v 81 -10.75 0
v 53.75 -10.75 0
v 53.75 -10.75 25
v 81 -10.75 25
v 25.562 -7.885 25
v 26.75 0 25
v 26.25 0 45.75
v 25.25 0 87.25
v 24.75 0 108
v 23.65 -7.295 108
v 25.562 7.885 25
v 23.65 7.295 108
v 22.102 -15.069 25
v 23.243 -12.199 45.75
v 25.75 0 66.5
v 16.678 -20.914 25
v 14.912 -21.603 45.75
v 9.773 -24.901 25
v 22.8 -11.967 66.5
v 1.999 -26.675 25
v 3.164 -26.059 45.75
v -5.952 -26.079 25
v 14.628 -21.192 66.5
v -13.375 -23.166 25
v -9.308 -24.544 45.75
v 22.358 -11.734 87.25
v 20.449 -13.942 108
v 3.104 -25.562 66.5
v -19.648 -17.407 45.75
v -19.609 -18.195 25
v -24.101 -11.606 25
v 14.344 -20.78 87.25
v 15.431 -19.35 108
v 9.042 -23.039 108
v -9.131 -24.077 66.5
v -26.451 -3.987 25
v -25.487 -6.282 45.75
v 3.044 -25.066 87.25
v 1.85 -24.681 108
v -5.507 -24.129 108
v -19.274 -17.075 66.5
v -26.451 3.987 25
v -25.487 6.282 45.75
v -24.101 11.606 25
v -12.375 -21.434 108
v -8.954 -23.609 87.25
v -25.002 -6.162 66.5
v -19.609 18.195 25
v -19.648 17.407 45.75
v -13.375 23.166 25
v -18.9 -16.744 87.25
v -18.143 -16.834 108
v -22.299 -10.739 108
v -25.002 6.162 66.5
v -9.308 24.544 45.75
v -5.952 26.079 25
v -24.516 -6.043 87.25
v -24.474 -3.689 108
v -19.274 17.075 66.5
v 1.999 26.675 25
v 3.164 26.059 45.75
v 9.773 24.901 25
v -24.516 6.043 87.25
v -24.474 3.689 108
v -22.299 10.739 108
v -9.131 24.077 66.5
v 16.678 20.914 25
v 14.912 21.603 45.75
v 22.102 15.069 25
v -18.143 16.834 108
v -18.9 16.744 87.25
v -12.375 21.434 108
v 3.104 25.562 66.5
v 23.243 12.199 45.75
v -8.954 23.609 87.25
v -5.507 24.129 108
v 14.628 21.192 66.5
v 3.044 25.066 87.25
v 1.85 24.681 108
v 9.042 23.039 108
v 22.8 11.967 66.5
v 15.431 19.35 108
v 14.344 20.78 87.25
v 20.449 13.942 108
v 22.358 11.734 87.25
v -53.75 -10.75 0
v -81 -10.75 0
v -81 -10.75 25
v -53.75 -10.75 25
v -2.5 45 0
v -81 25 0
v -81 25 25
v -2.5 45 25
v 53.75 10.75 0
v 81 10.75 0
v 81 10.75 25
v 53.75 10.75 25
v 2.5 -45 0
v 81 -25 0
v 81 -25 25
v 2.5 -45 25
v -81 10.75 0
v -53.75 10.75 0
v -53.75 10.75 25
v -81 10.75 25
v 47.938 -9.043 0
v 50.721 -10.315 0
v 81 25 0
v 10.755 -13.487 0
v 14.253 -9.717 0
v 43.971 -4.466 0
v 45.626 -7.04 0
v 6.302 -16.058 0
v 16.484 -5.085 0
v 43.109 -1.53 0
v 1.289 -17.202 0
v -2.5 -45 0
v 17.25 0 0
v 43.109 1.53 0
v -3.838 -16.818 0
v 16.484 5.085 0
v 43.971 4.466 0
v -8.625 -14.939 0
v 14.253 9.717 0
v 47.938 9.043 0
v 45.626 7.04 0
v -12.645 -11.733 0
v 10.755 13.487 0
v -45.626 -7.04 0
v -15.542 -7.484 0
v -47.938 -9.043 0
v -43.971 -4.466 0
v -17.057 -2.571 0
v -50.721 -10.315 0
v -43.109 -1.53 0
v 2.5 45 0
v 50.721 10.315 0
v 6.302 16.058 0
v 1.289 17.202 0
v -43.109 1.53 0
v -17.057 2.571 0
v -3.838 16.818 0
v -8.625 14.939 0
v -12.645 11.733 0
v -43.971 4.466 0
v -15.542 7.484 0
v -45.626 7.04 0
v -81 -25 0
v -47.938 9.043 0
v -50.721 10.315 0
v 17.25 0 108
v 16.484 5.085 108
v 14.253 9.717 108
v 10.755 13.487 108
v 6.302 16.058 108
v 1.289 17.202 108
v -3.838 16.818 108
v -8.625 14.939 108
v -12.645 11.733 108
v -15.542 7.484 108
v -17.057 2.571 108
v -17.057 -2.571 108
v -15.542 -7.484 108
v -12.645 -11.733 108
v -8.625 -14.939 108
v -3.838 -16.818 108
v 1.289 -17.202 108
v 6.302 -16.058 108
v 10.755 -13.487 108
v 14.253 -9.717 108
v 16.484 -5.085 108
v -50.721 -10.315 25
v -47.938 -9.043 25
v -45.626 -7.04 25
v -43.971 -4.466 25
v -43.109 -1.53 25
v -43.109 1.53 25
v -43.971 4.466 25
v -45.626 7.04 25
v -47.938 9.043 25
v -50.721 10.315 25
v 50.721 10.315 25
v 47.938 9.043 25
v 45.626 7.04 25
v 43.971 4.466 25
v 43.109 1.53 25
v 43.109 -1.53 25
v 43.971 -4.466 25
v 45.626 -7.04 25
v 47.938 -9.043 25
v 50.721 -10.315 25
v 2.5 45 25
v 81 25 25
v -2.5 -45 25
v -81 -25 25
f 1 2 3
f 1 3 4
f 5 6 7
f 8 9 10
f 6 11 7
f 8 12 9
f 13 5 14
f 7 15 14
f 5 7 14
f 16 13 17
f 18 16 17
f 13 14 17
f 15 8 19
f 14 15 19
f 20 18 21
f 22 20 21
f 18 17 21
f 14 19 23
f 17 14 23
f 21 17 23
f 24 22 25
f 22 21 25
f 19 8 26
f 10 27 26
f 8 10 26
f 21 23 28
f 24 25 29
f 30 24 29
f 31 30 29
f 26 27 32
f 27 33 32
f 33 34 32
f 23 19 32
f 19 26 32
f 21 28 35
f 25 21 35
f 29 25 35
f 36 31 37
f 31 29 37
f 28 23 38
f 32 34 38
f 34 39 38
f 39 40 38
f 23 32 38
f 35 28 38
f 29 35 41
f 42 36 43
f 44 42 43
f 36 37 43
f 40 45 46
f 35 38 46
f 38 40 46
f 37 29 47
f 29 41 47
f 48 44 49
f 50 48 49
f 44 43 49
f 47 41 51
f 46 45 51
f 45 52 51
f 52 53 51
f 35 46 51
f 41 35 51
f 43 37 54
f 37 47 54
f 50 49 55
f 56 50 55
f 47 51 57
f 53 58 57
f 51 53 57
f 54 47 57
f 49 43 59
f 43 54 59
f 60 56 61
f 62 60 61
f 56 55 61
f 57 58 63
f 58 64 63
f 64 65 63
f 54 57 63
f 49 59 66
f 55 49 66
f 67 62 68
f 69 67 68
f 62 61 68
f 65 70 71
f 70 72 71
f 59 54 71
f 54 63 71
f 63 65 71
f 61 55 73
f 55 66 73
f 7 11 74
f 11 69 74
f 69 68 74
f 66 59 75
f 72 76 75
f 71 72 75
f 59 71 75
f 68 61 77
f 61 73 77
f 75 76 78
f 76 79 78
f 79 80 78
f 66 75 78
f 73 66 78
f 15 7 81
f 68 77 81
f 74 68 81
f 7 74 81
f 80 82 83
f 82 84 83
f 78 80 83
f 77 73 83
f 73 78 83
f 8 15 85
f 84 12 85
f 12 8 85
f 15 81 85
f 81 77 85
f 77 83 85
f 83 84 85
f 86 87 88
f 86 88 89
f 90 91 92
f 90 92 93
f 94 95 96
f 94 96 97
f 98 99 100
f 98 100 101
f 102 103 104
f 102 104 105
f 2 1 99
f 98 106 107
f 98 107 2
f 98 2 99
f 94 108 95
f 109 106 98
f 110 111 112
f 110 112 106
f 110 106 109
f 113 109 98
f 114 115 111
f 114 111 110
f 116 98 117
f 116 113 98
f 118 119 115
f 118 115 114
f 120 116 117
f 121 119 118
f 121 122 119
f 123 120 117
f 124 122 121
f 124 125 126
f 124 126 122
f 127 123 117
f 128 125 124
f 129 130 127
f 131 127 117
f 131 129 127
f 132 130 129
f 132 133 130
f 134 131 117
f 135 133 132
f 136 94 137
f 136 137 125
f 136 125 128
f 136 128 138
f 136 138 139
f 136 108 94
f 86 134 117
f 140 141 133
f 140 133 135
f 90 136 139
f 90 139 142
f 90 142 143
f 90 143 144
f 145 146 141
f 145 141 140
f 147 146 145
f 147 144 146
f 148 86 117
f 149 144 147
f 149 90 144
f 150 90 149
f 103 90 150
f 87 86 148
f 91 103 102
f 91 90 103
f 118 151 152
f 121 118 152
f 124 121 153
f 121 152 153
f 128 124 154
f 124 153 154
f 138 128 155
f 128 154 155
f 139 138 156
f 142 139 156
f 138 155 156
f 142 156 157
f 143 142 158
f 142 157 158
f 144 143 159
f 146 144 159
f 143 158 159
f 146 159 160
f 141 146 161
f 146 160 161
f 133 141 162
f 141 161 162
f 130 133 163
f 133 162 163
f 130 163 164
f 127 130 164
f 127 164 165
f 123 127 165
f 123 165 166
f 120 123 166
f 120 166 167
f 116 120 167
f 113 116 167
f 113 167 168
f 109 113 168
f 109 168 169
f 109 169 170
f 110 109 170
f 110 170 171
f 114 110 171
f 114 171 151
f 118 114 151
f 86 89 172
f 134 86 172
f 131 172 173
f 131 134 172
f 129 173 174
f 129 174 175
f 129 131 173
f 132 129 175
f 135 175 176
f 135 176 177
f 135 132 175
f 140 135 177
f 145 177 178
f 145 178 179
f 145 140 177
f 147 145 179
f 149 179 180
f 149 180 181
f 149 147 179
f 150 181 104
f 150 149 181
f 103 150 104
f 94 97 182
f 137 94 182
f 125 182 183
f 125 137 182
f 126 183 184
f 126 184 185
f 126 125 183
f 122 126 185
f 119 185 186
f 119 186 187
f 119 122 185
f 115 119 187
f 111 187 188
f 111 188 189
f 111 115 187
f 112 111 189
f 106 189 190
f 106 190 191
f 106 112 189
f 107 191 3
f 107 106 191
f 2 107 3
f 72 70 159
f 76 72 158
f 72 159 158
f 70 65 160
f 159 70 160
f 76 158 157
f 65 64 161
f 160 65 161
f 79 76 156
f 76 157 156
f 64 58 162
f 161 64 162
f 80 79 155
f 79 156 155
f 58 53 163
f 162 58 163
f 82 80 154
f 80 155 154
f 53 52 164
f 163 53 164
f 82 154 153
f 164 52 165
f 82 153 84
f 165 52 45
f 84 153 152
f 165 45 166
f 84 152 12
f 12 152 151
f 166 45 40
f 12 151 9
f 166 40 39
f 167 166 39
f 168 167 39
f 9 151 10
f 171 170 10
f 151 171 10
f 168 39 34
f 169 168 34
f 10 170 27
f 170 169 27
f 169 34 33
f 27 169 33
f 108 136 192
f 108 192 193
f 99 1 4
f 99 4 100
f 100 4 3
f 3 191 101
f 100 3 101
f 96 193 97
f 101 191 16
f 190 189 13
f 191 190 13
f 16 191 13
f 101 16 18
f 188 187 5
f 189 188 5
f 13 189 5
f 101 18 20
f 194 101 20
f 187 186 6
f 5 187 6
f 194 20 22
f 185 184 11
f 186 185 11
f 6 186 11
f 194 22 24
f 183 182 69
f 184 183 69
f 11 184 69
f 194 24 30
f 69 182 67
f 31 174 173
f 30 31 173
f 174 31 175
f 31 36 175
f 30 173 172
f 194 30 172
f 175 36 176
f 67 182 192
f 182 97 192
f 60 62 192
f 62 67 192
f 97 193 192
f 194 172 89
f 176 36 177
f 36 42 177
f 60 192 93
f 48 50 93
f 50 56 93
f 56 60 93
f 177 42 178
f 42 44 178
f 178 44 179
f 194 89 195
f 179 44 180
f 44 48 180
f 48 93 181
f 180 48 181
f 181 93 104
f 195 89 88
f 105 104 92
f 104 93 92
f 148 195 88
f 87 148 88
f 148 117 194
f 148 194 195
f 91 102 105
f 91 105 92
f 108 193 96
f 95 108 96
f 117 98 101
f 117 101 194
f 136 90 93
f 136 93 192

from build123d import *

# Parameters (mm, degrees)
BOSS_EXTRUDE1_DEPTH = 25
CUT_EXTRUDE1_REACH  = 144.302
SKETCH4_R           = 17.25


with BuildPart() as part:
    # Sketch1 → Boss-Extrude1 (new body)
    with BuildSketch(Plane.XY):
        with BuildLine():
            Line((-2.5, 45), (2.5, 45))
            Line((2.5, 45), (81, 25))
            Line((81, 25), (81, 10.75))
            Line((81, 10.75), (53.75, 10.75))
            ThreePointArc((53.75, 10.75), (43, 0), (53.75, -10.75))
            Line((53.75, -10.75), (81, -10.75))
            Line((81, -10.75), (81, -25))
            Line((81, -25), (2.5, -45))
            Line((2.5, -45), (-2.5, -45))
            Line((-2.5, -45), (-81, -25))
            Line((-81, -25), (-81, -10.75))
            Line((-81, -10.75), (-53.75, -10.75))
            ThreePointArc((-53.75, -10.75), (-43, 0), (-53.75, 10.75))
            Line((-53.75, 10.75), (-81, 10.75))
            Line((-81, 10.75), (-81, 25))
            Line((-81, 25), (-2.5, 45))
        make_face()
    extrude(amount=BOSS_EXTRUDE1_DEPTH)

    # Sketch3 → Revolve1 (revolve)
    with BuildSketch(Plane(origin=(0, 0, 0), x_dir=(0, 0, -1), z_dir=(1, 0, 0))):
        Polygon((-25, 26.75), (-108, 24.75), (-108, 0), (-25, 0), align=None)
    revolve(axis=Axis((0, 0, 220.421976321), (0, 0, -1)))

    # Sketch4 → Cut-Extrude1 (cut, up to next)
    with BuildSketch(Plane.XY.offset(108), mode=Mode.PRIVATE) as cut_extrude1_sk1:
        Circle(SKETCH4_R)
    cut_extrude1_tool1 = extrude(cut_extrude1_sk1.sketch, amount=-CUT_EXTRUDE1_REACH, mode=Mode.PRIVATE) & part.part
    add(cut_extrude1_tool1.solids().sort_by_distance((0, 0, 108))[0], mode=Mode.SUBTRACT)


solid = part.part
